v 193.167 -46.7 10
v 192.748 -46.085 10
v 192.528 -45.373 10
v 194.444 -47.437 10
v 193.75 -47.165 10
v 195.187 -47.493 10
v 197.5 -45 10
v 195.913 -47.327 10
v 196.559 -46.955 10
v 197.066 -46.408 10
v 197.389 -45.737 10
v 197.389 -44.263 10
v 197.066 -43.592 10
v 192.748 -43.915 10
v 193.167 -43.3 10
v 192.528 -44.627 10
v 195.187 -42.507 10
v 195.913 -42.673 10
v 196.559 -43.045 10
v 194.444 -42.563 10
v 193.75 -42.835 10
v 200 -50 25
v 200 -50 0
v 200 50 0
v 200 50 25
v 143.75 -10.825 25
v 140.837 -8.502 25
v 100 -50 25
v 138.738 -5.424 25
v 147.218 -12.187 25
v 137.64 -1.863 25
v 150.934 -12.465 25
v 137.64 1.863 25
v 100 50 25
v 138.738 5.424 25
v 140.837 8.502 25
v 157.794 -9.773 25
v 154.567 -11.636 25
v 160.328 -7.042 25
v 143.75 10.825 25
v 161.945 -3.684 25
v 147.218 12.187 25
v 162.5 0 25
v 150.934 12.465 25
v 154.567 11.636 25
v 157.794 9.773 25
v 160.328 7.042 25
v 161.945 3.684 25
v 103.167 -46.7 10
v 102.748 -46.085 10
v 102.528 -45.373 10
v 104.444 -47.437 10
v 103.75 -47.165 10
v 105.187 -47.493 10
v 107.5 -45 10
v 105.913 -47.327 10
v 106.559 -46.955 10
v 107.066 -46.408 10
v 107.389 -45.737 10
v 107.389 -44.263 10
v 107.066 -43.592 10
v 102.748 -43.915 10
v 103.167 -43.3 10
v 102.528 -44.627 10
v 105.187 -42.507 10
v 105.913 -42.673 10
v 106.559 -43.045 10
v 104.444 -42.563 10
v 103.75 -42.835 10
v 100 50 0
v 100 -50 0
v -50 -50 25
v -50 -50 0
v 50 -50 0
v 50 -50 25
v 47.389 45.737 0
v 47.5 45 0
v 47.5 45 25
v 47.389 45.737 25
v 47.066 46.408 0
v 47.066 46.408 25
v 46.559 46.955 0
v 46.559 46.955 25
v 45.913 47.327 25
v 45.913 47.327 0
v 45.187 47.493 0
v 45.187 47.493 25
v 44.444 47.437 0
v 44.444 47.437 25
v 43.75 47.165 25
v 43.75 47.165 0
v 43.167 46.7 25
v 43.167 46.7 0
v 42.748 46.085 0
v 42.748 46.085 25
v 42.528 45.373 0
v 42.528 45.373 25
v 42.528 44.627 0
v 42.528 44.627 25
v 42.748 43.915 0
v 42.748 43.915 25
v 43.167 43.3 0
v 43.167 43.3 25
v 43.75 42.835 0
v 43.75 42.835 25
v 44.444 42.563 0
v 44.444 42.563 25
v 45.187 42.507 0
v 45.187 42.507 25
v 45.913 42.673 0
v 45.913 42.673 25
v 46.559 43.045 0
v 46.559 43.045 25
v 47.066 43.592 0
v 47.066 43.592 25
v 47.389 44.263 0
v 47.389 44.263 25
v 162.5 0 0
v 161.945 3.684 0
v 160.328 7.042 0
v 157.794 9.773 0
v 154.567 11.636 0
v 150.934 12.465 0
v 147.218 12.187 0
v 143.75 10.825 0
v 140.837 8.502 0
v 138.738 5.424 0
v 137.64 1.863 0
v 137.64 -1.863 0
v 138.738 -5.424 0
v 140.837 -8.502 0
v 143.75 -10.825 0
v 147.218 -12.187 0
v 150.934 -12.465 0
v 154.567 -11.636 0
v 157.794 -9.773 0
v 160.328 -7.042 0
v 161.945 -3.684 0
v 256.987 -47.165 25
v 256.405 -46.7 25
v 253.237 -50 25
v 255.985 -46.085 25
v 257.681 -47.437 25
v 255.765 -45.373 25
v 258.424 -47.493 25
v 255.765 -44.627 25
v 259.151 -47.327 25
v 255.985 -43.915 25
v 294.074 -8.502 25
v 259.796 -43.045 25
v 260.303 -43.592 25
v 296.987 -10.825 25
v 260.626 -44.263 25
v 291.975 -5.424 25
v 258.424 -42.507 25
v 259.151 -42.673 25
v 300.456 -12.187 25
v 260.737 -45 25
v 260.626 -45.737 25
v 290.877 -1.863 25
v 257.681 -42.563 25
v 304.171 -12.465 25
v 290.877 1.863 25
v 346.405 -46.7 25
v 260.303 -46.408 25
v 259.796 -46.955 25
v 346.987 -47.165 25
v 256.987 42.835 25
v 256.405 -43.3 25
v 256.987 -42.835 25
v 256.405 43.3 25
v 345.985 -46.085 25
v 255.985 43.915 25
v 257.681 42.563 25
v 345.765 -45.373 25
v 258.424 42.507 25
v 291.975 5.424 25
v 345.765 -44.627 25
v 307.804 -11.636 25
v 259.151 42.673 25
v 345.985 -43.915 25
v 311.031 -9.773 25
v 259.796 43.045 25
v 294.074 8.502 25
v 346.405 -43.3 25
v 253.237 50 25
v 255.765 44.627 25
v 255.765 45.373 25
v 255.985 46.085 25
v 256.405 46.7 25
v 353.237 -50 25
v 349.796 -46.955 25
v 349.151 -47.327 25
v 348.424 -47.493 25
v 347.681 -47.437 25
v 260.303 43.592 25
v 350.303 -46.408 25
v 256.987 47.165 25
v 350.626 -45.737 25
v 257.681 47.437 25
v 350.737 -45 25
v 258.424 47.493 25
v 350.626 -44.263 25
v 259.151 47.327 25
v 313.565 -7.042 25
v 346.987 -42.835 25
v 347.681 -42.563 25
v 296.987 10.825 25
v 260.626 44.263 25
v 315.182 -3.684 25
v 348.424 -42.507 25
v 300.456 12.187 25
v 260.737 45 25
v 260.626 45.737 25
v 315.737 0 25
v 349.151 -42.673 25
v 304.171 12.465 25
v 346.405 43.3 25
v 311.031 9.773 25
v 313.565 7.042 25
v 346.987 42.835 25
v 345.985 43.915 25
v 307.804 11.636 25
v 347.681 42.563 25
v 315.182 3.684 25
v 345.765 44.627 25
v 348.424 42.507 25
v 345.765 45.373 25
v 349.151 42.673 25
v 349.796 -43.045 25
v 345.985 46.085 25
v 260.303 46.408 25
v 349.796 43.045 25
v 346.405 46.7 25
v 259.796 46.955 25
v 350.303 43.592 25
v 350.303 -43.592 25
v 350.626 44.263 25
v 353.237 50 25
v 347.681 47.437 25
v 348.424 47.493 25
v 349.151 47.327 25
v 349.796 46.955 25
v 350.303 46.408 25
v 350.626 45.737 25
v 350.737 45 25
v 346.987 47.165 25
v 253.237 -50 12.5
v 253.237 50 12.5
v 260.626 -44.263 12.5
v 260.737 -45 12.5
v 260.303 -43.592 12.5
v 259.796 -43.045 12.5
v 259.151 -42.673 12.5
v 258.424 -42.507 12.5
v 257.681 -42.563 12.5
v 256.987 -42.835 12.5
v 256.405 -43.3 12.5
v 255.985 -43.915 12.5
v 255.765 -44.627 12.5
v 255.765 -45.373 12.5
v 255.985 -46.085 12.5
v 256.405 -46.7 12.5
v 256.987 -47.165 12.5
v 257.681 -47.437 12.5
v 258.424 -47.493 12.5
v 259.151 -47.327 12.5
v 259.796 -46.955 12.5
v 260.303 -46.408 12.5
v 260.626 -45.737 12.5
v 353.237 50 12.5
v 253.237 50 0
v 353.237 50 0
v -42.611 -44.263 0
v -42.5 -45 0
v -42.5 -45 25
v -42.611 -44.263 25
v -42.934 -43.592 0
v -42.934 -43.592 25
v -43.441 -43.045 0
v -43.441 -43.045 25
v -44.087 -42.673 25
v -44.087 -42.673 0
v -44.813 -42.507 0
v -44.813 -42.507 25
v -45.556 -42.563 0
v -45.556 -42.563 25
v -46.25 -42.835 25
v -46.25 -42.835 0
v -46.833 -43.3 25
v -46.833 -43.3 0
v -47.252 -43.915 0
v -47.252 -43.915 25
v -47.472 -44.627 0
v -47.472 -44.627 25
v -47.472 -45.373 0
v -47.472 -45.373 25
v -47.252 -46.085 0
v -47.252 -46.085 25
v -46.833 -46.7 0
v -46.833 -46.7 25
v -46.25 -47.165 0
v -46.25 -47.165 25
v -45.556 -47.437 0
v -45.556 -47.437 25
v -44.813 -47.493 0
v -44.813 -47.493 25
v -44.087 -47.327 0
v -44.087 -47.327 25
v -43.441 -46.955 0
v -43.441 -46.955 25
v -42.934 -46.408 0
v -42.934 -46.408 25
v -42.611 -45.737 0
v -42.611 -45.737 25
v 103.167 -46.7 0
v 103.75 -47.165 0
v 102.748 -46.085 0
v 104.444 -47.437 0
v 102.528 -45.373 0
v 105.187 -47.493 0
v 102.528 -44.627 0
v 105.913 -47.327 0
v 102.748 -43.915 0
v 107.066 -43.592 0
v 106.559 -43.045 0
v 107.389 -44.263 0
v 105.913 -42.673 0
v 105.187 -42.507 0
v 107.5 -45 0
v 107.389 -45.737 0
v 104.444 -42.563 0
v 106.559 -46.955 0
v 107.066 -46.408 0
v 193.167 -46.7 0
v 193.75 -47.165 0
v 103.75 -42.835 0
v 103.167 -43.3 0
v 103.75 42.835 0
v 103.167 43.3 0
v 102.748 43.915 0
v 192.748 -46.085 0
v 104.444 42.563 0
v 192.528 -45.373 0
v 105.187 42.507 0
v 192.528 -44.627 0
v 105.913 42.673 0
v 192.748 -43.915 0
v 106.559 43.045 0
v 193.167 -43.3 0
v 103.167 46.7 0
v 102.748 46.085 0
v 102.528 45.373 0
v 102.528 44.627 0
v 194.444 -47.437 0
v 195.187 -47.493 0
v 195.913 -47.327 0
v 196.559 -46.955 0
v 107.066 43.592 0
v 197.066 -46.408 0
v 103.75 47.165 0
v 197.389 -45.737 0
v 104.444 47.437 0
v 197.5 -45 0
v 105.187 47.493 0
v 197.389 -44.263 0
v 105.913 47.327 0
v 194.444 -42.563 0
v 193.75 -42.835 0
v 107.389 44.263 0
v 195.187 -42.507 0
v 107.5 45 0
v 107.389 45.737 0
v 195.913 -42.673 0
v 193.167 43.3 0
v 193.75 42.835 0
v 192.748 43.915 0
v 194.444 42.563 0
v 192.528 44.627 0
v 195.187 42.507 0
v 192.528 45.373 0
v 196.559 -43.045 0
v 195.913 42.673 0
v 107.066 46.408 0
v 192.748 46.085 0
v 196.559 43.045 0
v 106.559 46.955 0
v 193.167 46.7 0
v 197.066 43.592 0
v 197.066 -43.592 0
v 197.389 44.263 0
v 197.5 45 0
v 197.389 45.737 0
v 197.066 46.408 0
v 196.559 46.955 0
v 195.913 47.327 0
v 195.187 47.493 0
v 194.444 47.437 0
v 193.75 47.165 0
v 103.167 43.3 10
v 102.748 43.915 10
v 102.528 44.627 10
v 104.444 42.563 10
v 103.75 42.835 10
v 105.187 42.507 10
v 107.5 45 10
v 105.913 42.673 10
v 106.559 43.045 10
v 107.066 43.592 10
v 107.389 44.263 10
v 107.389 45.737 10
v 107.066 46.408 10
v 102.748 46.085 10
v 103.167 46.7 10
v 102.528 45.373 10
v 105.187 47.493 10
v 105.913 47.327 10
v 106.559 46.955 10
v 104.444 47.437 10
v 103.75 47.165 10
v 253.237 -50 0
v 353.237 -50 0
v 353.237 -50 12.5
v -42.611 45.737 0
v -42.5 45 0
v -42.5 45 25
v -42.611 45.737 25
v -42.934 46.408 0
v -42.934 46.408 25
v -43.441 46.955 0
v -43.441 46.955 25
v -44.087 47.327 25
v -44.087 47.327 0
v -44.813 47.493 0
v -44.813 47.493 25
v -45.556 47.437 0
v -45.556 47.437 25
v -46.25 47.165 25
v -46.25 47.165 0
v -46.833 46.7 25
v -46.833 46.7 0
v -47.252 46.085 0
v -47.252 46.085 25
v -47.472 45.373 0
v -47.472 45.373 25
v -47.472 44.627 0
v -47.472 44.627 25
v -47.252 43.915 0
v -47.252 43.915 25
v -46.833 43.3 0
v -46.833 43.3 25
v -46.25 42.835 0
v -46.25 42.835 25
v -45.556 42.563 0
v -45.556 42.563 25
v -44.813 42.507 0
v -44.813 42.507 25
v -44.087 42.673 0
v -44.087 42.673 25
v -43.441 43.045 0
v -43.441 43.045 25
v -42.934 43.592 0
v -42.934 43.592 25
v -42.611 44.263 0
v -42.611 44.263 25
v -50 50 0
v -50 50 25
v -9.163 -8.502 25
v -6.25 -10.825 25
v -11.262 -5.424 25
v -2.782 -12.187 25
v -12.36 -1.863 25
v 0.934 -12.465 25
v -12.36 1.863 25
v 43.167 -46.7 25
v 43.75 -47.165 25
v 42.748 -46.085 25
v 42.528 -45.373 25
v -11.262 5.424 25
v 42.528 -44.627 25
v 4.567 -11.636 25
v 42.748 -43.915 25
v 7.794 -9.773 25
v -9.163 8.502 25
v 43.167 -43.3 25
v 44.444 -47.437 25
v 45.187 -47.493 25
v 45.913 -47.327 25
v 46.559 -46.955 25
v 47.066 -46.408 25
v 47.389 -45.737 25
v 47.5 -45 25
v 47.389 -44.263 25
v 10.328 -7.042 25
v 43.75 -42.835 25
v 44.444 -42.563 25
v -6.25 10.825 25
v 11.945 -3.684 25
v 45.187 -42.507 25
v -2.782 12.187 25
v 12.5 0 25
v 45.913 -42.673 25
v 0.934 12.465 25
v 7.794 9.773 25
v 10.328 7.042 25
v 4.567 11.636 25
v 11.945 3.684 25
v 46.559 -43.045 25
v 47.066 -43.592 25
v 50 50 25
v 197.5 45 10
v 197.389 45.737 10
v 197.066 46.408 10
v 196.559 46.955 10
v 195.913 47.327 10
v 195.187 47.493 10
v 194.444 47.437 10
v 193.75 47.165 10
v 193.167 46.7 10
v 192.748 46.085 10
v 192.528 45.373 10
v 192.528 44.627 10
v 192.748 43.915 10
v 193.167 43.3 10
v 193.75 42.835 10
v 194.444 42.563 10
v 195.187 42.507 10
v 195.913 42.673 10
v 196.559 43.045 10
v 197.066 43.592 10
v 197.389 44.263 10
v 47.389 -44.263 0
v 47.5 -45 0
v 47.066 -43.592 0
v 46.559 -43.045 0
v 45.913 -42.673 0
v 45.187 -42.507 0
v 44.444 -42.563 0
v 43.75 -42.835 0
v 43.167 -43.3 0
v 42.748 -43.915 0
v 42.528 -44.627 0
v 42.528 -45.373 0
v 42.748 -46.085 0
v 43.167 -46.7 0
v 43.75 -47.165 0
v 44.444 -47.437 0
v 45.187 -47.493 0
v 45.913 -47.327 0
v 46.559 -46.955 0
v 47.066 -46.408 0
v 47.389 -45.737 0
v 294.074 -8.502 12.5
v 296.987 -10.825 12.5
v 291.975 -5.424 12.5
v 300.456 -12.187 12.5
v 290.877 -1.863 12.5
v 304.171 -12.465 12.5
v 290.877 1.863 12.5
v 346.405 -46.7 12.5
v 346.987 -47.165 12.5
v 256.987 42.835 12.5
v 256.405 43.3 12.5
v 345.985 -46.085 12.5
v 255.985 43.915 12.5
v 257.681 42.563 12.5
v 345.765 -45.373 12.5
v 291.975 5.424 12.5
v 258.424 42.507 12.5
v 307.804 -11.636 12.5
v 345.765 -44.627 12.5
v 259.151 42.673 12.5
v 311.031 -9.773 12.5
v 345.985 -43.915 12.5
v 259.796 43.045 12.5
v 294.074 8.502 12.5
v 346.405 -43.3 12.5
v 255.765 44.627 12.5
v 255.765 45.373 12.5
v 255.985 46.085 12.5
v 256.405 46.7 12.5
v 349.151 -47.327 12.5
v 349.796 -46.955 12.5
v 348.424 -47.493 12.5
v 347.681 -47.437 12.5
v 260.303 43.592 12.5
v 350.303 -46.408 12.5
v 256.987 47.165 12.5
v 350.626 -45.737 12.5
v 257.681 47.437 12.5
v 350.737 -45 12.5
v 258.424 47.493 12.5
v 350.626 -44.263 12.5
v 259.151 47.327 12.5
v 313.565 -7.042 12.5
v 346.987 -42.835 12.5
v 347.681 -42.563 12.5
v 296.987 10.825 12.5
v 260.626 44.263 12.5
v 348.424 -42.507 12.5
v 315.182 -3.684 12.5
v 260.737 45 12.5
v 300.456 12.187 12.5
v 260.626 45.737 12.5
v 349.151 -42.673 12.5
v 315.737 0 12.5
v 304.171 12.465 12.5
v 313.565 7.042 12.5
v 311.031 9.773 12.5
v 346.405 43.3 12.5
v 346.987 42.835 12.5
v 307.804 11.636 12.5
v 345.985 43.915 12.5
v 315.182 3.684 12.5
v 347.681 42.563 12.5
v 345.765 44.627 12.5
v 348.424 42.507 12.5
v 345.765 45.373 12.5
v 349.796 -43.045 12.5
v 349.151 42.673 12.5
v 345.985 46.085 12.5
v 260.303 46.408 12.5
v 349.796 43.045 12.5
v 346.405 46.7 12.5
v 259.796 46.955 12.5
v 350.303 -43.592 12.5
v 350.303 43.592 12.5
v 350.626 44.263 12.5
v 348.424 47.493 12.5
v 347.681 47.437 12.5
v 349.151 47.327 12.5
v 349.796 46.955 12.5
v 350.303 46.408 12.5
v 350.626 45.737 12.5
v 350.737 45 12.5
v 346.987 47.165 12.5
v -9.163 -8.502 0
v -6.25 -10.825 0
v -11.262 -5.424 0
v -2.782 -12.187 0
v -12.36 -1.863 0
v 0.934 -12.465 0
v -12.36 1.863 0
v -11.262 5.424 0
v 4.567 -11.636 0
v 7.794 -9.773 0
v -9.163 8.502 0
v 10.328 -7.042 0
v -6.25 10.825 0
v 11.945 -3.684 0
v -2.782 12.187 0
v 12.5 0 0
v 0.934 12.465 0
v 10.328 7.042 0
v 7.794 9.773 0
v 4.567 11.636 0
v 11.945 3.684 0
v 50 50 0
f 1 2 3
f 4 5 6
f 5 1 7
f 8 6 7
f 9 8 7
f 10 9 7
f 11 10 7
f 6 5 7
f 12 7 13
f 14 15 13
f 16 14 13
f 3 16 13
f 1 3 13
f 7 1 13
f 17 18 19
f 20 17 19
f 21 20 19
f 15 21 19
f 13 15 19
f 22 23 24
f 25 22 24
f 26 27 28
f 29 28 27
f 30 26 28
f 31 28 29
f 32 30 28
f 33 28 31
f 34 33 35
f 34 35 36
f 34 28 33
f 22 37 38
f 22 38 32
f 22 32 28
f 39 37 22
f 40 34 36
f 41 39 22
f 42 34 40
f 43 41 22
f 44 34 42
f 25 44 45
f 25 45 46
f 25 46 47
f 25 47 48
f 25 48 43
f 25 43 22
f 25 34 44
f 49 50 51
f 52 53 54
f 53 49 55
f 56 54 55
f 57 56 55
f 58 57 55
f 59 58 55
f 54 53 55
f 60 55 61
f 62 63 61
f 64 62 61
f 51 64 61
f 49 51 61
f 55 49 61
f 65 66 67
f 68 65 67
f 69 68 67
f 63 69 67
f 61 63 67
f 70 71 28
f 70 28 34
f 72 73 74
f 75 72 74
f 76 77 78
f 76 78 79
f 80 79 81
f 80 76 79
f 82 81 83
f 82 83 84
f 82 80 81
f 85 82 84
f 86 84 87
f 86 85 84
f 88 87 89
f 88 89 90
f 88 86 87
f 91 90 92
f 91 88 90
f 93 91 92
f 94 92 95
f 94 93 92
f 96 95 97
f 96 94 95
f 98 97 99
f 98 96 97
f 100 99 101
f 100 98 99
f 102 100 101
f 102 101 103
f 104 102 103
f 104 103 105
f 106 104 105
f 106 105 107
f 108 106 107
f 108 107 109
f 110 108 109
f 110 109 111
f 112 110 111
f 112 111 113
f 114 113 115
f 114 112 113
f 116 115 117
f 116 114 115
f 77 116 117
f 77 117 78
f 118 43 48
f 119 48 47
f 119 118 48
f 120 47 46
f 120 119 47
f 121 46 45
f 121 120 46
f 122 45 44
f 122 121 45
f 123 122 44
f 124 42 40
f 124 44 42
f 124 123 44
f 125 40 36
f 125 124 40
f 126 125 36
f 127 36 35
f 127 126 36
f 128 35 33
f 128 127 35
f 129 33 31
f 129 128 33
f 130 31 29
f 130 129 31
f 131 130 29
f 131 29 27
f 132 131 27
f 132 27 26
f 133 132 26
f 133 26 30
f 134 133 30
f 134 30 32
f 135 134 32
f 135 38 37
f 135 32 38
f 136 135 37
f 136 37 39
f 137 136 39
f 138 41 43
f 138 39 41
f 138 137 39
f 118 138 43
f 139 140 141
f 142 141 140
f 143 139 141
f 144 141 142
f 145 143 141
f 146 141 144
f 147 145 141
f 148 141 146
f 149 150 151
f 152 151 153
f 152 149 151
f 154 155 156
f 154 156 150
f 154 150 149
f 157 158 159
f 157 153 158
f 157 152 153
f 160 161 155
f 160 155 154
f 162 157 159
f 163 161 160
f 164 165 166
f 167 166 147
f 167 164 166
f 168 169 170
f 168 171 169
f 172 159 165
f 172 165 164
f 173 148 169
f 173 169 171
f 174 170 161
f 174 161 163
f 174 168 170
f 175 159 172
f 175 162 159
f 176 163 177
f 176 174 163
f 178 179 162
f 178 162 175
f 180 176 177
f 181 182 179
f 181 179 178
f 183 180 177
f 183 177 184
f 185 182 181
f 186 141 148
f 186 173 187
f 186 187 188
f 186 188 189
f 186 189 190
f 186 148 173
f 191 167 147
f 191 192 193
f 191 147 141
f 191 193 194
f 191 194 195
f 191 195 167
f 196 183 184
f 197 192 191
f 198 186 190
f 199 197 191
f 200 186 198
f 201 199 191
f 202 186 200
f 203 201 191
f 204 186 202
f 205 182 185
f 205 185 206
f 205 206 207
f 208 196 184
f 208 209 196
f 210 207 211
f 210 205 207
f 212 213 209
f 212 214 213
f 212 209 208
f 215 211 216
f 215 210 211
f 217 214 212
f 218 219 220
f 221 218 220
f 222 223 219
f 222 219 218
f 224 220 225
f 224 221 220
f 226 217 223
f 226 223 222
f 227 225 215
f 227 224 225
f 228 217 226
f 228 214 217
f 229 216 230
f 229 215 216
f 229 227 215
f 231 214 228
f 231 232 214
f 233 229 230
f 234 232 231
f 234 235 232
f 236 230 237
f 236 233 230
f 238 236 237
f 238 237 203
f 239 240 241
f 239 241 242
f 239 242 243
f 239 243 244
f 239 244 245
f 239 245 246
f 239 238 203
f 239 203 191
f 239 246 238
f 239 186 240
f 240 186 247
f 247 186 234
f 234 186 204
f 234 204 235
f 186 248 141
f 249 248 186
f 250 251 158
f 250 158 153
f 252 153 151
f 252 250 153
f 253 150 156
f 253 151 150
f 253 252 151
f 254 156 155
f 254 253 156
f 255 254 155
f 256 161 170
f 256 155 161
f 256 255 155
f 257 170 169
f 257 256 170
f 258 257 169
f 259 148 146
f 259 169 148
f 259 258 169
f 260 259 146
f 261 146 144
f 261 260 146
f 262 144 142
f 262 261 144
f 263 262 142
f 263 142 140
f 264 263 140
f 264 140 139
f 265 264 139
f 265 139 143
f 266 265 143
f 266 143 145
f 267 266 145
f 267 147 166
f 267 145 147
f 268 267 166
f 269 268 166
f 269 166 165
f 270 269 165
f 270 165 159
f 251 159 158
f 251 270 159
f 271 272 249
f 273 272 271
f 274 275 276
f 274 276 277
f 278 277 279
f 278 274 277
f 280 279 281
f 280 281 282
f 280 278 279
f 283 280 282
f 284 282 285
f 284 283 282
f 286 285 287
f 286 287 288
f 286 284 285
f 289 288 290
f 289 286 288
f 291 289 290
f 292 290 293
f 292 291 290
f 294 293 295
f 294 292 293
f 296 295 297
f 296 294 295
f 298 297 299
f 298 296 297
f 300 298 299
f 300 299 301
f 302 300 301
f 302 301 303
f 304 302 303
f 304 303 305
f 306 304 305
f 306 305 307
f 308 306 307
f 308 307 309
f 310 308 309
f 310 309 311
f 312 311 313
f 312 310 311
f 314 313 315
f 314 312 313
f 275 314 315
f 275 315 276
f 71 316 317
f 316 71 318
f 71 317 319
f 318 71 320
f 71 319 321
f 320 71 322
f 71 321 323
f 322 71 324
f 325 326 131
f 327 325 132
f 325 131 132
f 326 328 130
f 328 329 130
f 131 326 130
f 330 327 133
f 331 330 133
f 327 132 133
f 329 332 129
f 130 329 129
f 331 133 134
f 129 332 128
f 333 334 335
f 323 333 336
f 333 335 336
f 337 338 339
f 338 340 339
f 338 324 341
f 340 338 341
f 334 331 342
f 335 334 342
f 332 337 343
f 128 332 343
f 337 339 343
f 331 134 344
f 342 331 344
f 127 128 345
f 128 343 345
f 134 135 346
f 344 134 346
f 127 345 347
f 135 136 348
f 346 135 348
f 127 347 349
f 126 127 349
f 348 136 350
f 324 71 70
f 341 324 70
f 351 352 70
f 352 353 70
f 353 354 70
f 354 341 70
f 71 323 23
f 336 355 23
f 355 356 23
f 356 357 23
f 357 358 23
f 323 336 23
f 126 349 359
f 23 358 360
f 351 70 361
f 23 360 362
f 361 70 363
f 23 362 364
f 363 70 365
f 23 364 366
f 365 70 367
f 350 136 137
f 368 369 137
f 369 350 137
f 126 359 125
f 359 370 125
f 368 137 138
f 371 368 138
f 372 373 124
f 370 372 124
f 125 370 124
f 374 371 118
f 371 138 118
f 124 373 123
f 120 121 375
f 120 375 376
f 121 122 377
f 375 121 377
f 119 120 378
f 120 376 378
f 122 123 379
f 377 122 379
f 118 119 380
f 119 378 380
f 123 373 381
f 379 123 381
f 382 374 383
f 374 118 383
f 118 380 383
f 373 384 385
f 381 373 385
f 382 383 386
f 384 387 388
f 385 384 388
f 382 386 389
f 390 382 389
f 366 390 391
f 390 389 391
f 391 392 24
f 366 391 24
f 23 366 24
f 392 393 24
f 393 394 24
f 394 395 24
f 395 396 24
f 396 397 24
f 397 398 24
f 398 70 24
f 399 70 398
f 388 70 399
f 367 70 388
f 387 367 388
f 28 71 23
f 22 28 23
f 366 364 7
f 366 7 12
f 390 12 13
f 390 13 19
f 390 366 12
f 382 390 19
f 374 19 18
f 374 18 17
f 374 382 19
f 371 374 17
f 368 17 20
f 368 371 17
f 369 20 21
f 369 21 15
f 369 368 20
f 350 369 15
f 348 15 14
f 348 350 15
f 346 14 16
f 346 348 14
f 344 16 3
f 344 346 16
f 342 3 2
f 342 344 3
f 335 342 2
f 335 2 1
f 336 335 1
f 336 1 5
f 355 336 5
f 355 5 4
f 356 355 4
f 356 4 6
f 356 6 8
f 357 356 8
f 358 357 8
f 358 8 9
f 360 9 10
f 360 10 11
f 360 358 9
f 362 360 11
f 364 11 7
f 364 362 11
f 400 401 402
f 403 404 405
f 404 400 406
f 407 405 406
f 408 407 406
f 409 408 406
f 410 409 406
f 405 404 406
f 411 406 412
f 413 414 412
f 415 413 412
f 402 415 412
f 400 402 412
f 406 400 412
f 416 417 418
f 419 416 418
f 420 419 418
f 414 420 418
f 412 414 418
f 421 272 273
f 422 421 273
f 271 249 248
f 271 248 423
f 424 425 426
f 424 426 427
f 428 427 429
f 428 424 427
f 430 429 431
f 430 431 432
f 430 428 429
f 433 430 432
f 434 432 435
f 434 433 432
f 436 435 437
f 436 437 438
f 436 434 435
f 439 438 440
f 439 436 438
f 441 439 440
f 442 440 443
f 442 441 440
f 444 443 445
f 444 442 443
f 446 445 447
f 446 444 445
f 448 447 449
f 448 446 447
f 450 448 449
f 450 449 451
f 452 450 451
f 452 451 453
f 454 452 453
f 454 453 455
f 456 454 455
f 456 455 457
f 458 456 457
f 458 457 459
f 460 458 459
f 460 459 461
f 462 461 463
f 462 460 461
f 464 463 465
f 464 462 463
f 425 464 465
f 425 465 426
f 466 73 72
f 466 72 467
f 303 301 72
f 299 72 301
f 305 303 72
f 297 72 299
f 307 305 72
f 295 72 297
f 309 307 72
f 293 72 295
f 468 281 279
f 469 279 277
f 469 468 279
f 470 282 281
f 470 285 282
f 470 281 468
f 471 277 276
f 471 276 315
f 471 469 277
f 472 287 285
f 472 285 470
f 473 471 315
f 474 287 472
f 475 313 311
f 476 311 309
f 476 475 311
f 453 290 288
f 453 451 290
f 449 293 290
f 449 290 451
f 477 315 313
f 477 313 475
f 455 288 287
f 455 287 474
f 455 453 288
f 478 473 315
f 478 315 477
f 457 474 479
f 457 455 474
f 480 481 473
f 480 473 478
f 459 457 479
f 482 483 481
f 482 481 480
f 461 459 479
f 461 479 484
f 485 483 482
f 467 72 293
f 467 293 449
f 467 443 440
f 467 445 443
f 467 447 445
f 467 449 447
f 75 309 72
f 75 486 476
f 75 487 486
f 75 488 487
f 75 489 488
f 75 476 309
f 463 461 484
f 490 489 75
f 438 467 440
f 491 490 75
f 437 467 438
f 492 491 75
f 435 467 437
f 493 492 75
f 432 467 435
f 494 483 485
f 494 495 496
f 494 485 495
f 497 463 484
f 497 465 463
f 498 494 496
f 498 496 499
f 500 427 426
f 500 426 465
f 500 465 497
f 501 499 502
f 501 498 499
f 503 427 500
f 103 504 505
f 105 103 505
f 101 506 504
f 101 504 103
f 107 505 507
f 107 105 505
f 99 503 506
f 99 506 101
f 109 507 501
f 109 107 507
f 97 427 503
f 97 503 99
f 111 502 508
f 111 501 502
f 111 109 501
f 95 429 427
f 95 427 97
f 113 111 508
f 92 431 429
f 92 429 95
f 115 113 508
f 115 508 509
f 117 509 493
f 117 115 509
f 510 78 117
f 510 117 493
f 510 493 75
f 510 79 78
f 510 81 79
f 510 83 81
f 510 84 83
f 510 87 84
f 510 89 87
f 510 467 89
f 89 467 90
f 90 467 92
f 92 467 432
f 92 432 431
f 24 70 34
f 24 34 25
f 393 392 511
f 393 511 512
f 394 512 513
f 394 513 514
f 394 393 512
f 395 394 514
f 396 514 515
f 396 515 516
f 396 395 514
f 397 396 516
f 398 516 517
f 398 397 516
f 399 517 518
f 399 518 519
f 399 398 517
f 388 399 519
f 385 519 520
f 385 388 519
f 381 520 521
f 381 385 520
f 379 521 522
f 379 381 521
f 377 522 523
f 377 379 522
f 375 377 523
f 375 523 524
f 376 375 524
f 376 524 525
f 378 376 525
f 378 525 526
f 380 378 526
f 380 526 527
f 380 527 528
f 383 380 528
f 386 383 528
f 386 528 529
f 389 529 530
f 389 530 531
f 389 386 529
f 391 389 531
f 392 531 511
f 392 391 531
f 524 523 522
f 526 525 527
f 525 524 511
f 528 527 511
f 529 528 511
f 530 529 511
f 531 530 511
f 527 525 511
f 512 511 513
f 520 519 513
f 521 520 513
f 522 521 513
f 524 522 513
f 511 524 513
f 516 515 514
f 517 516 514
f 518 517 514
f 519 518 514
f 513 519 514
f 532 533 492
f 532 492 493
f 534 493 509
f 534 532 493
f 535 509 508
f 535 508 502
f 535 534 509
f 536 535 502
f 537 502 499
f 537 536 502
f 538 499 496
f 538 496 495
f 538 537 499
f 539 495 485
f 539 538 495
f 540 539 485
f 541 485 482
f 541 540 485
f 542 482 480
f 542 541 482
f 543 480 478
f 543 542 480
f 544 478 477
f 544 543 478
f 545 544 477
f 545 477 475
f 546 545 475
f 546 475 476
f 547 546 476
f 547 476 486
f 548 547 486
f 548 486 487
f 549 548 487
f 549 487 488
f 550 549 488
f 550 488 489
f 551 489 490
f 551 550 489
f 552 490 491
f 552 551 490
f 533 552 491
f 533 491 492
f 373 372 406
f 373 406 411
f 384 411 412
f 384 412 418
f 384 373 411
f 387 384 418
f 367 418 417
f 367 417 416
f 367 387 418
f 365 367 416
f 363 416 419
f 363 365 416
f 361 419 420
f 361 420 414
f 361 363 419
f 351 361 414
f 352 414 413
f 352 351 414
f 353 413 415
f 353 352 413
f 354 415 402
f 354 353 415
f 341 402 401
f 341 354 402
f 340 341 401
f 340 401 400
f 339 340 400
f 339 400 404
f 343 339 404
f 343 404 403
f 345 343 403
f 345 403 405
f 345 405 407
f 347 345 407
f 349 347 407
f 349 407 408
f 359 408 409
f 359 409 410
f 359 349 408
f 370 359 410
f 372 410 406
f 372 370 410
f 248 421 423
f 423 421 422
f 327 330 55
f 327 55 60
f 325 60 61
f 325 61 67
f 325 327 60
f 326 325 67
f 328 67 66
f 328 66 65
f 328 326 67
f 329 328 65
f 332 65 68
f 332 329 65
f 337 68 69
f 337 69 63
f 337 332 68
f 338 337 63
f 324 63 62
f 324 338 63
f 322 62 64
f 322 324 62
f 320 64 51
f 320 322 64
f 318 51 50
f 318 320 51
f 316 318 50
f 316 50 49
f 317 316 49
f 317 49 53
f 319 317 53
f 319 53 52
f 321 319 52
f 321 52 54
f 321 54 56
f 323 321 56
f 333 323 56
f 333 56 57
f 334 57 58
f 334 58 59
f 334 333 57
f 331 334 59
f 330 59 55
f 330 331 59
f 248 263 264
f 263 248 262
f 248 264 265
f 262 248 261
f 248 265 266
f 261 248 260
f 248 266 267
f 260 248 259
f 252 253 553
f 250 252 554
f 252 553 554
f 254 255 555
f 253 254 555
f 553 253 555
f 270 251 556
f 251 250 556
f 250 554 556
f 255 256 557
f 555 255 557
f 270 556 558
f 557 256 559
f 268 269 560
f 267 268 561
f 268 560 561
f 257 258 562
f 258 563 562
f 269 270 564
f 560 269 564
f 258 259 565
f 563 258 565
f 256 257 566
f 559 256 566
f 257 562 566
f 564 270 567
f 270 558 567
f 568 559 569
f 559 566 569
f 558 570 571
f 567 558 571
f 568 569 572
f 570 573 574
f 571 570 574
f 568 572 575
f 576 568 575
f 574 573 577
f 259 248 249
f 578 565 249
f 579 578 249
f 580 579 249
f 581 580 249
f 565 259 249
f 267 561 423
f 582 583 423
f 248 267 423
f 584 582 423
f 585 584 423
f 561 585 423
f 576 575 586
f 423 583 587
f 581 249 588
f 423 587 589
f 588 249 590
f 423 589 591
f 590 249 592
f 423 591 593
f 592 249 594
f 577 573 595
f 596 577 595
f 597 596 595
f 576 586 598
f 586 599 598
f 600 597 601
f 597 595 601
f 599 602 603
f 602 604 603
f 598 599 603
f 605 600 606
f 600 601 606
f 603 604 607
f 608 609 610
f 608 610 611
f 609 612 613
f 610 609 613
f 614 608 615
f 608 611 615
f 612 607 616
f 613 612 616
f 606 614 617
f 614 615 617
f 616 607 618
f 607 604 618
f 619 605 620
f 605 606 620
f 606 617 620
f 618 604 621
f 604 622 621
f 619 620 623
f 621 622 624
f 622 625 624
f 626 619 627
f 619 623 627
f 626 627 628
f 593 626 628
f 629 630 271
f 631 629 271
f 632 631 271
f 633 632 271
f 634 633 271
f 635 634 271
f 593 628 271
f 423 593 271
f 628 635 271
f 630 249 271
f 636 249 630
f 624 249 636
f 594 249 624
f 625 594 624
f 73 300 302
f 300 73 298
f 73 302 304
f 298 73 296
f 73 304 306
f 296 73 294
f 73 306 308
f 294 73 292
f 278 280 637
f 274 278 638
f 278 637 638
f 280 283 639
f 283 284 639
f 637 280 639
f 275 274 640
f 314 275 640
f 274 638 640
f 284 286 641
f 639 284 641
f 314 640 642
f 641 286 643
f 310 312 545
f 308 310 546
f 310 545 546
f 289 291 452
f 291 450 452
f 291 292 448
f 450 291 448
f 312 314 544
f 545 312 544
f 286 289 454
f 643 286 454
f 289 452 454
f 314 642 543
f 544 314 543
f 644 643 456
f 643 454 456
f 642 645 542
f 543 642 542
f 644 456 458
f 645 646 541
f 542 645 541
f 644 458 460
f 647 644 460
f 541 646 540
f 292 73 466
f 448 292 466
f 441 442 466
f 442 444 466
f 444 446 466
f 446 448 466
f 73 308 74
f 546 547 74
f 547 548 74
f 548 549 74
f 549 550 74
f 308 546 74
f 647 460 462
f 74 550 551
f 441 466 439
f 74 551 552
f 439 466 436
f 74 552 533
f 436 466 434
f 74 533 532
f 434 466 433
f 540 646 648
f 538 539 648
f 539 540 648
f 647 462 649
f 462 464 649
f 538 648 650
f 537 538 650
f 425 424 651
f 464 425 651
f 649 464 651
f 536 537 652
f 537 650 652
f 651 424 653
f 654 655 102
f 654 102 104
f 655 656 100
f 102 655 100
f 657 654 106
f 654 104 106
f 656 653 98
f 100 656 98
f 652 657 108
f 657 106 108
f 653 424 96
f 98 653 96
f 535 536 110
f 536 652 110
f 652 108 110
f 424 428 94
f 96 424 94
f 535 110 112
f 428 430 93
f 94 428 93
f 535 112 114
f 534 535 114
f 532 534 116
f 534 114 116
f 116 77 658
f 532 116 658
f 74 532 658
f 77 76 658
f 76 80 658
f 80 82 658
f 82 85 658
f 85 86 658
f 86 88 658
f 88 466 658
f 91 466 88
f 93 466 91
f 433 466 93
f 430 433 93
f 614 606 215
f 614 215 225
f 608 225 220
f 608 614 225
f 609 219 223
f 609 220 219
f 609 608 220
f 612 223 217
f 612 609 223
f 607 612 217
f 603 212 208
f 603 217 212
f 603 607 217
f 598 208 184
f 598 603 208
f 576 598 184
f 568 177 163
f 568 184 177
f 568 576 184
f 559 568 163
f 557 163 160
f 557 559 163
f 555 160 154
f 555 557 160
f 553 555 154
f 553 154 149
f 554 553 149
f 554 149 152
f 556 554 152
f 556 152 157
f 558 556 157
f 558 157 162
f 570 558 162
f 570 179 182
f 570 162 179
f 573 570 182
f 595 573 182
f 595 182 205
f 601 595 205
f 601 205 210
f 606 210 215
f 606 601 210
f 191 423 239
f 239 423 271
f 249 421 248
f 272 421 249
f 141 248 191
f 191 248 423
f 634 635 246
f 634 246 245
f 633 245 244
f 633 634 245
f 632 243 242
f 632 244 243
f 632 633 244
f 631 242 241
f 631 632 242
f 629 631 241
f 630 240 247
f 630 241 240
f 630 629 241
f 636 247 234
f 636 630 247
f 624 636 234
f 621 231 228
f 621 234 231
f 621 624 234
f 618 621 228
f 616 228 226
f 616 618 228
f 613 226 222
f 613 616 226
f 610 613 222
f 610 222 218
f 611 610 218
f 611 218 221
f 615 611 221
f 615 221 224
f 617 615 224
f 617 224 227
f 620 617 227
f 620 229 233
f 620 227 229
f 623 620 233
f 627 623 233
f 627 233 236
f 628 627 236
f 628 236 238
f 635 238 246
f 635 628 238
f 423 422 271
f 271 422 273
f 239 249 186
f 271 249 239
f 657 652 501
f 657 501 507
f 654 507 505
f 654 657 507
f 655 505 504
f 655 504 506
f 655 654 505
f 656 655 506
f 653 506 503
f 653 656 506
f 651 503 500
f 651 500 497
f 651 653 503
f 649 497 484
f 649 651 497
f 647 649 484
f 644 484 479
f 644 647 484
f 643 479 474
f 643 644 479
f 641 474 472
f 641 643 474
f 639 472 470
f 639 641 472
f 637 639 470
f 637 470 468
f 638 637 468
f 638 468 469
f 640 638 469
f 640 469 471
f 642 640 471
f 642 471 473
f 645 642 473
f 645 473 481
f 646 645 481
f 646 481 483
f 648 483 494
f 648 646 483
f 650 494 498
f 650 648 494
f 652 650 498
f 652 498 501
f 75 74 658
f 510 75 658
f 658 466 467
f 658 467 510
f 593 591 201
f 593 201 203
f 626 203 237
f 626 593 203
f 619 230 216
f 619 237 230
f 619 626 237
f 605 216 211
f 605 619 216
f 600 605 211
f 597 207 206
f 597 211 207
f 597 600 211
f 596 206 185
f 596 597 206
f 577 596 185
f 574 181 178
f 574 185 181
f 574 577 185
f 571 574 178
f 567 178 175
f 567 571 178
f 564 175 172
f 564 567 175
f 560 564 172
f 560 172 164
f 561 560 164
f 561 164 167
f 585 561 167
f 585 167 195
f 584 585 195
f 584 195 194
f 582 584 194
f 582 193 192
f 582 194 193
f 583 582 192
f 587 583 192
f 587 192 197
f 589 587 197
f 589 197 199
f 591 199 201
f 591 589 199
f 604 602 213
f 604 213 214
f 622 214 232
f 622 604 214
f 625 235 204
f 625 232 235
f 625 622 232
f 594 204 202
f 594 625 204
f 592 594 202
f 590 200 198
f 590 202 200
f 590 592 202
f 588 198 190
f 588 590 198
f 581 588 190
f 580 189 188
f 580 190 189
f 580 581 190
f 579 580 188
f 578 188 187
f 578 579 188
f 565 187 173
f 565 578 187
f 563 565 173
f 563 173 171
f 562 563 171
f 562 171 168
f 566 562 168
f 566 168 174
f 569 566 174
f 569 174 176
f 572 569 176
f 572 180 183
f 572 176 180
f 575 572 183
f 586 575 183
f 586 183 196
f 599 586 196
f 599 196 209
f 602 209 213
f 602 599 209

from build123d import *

# Parameters (mm, degrees)
F1_W     = 100
F1_H     = 100
F1_R     = 2.5
F1_R_2   = 12.5
F3_DEPTH = 25
F2_W     = 100
F2_H     = 100
F2_R     = 2.5
F2_R_2   = 12.5
F4_DEPTH = 12.5
F5_DEPTH = 12.5
F0_W     = 100
F0_H     = 100
F0_R     = 2.5
F0_R_2   = 12.5
F6_DEPTH = 25
F7_DEPTH = 25.001
F8_DEPTH = 10
F9_DEPTH = 25.001


with BuildPart() as f3:
    # F1 (on Top) → F3 (new body)
    with BuildSketch(Plane.XY):
        with Locations((150, 0)):
            Rectangle(F1_W, F1_H)
        with Locations((105, -45)):
            Circle(F1_R, mode=Mode.SUBTRACT)
        with Locations((195, -45)):
            Circle(F1_R, mode=Mode.SUBTRACT)
        with Locations((105, 45)):
            Circle(F1_R, mode=Mode.SUBTRACT)
        with Locations((150, 0)):
            Circle(F1_R_2, mode=Mode.SUBTRACT)
        with Locations((195, 45)):
            Circle(F1_R, mode=Mode.SUBTRACT)
        with Locations((150, 0)):
            Circle(F1_R_2)
        with Locations((195, -45)):
            Circle(F1_R)
        with Locations((195, 45)):
            Circle(F1_R)
        with Locations((105, 45)):
            Circle(F1_R)
        with Locations((105, -45)):
            Circle(F1_R)
    extrude(amount=F3_DEPTH)

    # F1 (on Top) → F7 (cut, through all)
    with BuildSketch(Plane.XY):
        with Locations((150, 0)):
            Circle(F1_R_2)
    extrude(amount=F7_DEPTH, mode=Mode.SUBTRACT)

    # F1 (on Top) → F8 (cut)
    with BuildSketch(Plane.XY):
        with Locations((195, -45)):
            Circle(F1_R)
        with Locations((105, -45)):
            Circle(F1_R)
        with Locations((105, 45)):
            Circle(F1_R)
        with Locations((195, 45)):
            Circle(F1_R)
    extrude(amount=F8_DEPTH, mode=Mode.SUBTRACT)


with BuildPart() as f4:
    # F2 (on Top) → F4 (new body)
    with BuildSketch(Plane.XY):
        with Locations((303.2371522859, 0)):
            Rectangle(F2_W, F2_H)
        with Locations((258.2371522859, -45)):
            Circle(F2_R, mode=Mode.SUBTRACT)
        with Locations((348.2371522859, -45)):
            Circle(F2_R, mode=Mode.SUBTRACT)
        with Locations((303.2371522859, 0)):
            Circle(F2_R_2, mode=Mode.SUBTRACT)
        with Locations((258.2371522859, 45)):
            Circle(F2_R, mode=Mode.SUBTRACT)
        with Locations((348.2371522859, 45)):
            Circle(F2_R, mode=Mode.SUBTRACT)
        with Locations((303.2371522859, 0)):
            Circle(F2_R_2)
        with Locations((348.2371522859, 45)):
            Circle(F2_R)
        with Locations((348.2371522859, -45)):
            Circle(F2_R)
        with Locations((258.2371522859, -45)):
            Circle(F2_R)
        with Locations((258.2371522859, 45)):
            Circle(F2_R)
    extrude(amount=F4_DEPTH)


with BuildPart() as f5:
    # F5 (new): a face of the model
    f5_faces = [f4.part.faces().sort_by_distance(p)[0] for p in [
        (303.2371522859, 0, 12.5),
    ]]
    extrude(f5_faces, amount=F5_DEPTH)

    # F2 (on Top) → F9 (cut, through all)
    with BuildSketch(Plane.XY):
        with Locations((303.2371522859, 0)):
            Circle(F2_R_2)
        with Locations((348.2371522859, -45)):
            Circle(F2_R)
        with Locations((258.2371522859, -45)):
            Circle(F2_R)
        with Locations((258.2371522859, 45)):
            Circle(F2_R)
        with Locations((348.2371522859, 45)):
            Circle(F2_R)
    extrude(amount=F9_DEPTH, mode=Mode.SUBTRACT)


with BuildPart() as f6:
    # F0 (on Top) → F6 (new body)
    with BuildSketch(Plane.XY):
        Rectangle(F0_W, F0_H)
        with Locations((-45, -45)):
            Circle(F0_R, mode=Mode.SUBTRACT)
        with Locations((45, -45)):
            Circle(F0_R, mode=Mode.SUBTRACT)
        with Locations((-45, 45)):
            Circle(F0_R, mode=Mode.SUBTRACT)
        Circle(F0_R_2, mode=Mode.SUBTRACT)
        with Locations((45, 45)):
            Circle(F0_R, mode=Mode.SUBTRACT)
    extrude(amount=F6_DEPTH)


solid = Compound([f3.part, f4.part, f5.part, f6.part])
